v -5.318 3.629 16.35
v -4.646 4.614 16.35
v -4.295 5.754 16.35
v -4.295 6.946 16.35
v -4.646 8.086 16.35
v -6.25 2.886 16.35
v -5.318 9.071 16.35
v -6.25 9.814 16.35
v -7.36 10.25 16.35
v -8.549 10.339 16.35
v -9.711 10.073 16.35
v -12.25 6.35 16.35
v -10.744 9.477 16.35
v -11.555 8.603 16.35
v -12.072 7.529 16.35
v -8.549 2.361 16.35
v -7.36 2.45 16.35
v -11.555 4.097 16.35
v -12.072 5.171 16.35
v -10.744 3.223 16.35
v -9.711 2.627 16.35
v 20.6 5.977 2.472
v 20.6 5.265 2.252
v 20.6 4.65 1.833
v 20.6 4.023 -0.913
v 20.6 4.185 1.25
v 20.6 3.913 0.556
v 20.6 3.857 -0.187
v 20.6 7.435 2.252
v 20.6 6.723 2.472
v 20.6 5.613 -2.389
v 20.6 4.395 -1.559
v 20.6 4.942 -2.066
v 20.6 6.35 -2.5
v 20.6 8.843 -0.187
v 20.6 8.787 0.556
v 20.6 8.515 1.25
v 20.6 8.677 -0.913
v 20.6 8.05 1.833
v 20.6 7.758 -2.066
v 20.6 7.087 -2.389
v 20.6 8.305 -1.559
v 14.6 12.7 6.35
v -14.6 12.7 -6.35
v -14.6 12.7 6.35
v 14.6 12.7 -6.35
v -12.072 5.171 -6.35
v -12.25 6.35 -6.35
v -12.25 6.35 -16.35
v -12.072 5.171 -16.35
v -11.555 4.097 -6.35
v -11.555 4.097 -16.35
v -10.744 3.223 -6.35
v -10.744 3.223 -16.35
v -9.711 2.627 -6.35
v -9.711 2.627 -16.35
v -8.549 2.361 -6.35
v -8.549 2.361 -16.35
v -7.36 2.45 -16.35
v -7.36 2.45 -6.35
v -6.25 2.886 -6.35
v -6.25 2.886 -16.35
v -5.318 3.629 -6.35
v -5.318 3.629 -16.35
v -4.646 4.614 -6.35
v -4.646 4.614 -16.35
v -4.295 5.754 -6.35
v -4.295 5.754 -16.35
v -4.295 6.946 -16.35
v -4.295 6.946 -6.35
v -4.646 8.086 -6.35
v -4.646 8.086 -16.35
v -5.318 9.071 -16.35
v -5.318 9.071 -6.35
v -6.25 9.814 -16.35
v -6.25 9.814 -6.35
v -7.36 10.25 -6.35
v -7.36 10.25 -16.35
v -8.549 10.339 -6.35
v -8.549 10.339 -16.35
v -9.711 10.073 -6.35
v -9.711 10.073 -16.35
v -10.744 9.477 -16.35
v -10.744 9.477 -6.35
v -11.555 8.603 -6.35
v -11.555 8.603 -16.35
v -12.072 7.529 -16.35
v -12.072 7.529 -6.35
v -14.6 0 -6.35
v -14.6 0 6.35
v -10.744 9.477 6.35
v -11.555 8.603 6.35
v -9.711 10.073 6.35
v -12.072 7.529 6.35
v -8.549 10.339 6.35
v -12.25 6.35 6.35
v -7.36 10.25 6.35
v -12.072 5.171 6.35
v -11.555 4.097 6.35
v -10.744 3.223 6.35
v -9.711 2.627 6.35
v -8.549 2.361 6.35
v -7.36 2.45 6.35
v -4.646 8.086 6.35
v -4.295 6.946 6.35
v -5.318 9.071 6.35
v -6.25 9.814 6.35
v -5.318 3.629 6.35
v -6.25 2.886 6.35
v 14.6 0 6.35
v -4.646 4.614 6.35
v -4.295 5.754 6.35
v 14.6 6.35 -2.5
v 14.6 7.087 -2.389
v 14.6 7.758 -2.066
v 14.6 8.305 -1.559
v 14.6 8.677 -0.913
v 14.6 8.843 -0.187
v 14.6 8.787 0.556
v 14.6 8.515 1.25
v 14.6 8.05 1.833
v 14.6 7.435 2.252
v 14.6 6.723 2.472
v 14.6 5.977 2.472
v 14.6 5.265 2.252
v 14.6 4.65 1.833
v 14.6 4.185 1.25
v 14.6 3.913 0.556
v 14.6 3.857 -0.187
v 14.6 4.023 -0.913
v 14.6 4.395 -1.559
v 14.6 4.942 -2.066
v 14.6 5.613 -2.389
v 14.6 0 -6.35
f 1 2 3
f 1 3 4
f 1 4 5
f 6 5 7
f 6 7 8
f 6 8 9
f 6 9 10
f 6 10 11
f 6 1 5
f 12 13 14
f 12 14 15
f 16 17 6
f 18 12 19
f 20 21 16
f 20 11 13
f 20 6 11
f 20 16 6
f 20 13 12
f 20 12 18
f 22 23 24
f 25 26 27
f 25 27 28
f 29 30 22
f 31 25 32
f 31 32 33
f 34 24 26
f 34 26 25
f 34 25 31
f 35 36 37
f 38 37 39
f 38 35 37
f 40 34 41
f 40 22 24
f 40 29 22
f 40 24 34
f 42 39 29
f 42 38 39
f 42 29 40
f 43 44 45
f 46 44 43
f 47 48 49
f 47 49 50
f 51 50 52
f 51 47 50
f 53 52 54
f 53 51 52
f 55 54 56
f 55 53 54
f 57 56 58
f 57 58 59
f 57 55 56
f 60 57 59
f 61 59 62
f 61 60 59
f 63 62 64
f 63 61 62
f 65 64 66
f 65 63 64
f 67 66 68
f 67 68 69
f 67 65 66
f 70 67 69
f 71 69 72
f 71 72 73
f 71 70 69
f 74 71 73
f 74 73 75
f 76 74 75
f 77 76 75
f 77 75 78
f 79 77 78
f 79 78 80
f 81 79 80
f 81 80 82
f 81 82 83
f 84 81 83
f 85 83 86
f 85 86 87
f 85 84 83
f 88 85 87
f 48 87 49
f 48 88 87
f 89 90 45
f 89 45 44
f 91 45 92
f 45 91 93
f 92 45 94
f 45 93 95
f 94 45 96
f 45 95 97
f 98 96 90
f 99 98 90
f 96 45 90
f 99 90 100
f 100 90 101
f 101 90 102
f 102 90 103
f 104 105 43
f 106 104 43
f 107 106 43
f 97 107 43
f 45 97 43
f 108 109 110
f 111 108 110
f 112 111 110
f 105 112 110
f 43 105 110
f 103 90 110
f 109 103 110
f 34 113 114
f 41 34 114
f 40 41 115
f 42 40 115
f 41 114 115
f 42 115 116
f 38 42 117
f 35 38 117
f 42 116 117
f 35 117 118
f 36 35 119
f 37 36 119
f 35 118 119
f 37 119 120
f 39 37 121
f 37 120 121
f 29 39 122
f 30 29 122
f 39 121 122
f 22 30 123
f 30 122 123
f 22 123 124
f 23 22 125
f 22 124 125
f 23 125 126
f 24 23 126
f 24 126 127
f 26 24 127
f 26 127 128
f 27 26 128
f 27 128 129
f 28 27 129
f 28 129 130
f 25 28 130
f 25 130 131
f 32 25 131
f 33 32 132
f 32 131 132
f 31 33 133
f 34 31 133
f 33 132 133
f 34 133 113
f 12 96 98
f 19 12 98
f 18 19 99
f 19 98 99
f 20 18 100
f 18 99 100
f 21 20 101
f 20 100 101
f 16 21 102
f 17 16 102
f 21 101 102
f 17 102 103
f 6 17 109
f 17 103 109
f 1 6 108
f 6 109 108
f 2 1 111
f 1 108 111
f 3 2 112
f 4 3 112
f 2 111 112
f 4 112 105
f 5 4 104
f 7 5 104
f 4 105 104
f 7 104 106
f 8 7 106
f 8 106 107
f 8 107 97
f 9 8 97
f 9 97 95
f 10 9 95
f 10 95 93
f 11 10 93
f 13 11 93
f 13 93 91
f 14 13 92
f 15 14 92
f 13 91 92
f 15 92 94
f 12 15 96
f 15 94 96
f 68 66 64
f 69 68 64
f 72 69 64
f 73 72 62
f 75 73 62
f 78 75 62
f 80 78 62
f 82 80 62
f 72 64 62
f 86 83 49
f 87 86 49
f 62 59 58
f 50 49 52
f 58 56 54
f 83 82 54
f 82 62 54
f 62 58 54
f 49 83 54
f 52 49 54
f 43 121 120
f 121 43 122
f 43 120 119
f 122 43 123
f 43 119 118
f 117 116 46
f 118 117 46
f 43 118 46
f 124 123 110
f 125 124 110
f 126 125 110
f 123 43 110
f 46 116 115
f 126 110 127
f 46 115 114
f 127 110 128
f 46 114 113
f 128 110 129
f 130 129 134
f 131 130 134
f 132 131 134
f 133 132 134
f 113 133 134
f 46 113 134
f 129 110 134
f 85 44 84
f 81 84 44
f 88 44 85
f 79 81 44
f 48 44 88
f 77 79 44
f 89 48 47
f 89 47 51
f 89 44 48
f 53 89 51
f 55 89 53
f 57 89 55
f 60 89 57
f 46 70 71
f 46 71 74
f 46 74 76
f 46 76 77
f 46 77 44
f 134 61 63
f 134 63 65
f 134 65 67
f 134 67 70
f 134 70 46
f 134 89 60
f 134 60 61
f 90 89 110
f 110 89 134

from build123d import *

# Parameters (mm, degrees)
SKETCH1_W           = 29.2
SKETCH1_H           = 12.7
BOSS_EXTRUDE1_DEPTH = 12.7
SKETCH2_R           = 4
BOSS_EXTRUDE2_DEPTH = 10
SKETCH3_R           = 2.5
BOSS_EXTRUDE3_DEPTH = 6


with BuildPart() as part:
    # Sketch1 → Boss-Extrude1 (new body)
    with BuildSketch(Plane(origin=(0, 0, 0), x_dir=(1, 0, 0), z_dir=(0, 1, 0))):
        Rectangle(SKETCH1_W, SKETCH1_H)
    extrude(amount=BOSS_EXTRUDE1_DEPTH)

    # Sketch2 → Boss-Extrude2 (add)
    with BuildSketch(Plane.XY.offset(6.35)):
        with Locations(Location((-8.25, 6.35, 0), (0, 0, 180))):
            Circle(SKETCH2_R)
    boss_extrude2 = extrude(amount=BOSS_EXTRUDE2_DEPTH)

    # Mirror1: Boss-Extrude2 across plane
    add(boss_extrude2.mirror(Plane.XY))

    # Sketch3 → Boss-Extrude3 (add)
    with BuildSketch(Plane(origin=(14.6, 0, 0), x_dir=(0, 0, -1), z_dir=(1, 0, 0))):
        with Locations((0, 6.35)):
            Circle(SKETCH3_R)
    extrude(amount=BOSS_EXTRUDE3_DEPTH)


solid = part.part
